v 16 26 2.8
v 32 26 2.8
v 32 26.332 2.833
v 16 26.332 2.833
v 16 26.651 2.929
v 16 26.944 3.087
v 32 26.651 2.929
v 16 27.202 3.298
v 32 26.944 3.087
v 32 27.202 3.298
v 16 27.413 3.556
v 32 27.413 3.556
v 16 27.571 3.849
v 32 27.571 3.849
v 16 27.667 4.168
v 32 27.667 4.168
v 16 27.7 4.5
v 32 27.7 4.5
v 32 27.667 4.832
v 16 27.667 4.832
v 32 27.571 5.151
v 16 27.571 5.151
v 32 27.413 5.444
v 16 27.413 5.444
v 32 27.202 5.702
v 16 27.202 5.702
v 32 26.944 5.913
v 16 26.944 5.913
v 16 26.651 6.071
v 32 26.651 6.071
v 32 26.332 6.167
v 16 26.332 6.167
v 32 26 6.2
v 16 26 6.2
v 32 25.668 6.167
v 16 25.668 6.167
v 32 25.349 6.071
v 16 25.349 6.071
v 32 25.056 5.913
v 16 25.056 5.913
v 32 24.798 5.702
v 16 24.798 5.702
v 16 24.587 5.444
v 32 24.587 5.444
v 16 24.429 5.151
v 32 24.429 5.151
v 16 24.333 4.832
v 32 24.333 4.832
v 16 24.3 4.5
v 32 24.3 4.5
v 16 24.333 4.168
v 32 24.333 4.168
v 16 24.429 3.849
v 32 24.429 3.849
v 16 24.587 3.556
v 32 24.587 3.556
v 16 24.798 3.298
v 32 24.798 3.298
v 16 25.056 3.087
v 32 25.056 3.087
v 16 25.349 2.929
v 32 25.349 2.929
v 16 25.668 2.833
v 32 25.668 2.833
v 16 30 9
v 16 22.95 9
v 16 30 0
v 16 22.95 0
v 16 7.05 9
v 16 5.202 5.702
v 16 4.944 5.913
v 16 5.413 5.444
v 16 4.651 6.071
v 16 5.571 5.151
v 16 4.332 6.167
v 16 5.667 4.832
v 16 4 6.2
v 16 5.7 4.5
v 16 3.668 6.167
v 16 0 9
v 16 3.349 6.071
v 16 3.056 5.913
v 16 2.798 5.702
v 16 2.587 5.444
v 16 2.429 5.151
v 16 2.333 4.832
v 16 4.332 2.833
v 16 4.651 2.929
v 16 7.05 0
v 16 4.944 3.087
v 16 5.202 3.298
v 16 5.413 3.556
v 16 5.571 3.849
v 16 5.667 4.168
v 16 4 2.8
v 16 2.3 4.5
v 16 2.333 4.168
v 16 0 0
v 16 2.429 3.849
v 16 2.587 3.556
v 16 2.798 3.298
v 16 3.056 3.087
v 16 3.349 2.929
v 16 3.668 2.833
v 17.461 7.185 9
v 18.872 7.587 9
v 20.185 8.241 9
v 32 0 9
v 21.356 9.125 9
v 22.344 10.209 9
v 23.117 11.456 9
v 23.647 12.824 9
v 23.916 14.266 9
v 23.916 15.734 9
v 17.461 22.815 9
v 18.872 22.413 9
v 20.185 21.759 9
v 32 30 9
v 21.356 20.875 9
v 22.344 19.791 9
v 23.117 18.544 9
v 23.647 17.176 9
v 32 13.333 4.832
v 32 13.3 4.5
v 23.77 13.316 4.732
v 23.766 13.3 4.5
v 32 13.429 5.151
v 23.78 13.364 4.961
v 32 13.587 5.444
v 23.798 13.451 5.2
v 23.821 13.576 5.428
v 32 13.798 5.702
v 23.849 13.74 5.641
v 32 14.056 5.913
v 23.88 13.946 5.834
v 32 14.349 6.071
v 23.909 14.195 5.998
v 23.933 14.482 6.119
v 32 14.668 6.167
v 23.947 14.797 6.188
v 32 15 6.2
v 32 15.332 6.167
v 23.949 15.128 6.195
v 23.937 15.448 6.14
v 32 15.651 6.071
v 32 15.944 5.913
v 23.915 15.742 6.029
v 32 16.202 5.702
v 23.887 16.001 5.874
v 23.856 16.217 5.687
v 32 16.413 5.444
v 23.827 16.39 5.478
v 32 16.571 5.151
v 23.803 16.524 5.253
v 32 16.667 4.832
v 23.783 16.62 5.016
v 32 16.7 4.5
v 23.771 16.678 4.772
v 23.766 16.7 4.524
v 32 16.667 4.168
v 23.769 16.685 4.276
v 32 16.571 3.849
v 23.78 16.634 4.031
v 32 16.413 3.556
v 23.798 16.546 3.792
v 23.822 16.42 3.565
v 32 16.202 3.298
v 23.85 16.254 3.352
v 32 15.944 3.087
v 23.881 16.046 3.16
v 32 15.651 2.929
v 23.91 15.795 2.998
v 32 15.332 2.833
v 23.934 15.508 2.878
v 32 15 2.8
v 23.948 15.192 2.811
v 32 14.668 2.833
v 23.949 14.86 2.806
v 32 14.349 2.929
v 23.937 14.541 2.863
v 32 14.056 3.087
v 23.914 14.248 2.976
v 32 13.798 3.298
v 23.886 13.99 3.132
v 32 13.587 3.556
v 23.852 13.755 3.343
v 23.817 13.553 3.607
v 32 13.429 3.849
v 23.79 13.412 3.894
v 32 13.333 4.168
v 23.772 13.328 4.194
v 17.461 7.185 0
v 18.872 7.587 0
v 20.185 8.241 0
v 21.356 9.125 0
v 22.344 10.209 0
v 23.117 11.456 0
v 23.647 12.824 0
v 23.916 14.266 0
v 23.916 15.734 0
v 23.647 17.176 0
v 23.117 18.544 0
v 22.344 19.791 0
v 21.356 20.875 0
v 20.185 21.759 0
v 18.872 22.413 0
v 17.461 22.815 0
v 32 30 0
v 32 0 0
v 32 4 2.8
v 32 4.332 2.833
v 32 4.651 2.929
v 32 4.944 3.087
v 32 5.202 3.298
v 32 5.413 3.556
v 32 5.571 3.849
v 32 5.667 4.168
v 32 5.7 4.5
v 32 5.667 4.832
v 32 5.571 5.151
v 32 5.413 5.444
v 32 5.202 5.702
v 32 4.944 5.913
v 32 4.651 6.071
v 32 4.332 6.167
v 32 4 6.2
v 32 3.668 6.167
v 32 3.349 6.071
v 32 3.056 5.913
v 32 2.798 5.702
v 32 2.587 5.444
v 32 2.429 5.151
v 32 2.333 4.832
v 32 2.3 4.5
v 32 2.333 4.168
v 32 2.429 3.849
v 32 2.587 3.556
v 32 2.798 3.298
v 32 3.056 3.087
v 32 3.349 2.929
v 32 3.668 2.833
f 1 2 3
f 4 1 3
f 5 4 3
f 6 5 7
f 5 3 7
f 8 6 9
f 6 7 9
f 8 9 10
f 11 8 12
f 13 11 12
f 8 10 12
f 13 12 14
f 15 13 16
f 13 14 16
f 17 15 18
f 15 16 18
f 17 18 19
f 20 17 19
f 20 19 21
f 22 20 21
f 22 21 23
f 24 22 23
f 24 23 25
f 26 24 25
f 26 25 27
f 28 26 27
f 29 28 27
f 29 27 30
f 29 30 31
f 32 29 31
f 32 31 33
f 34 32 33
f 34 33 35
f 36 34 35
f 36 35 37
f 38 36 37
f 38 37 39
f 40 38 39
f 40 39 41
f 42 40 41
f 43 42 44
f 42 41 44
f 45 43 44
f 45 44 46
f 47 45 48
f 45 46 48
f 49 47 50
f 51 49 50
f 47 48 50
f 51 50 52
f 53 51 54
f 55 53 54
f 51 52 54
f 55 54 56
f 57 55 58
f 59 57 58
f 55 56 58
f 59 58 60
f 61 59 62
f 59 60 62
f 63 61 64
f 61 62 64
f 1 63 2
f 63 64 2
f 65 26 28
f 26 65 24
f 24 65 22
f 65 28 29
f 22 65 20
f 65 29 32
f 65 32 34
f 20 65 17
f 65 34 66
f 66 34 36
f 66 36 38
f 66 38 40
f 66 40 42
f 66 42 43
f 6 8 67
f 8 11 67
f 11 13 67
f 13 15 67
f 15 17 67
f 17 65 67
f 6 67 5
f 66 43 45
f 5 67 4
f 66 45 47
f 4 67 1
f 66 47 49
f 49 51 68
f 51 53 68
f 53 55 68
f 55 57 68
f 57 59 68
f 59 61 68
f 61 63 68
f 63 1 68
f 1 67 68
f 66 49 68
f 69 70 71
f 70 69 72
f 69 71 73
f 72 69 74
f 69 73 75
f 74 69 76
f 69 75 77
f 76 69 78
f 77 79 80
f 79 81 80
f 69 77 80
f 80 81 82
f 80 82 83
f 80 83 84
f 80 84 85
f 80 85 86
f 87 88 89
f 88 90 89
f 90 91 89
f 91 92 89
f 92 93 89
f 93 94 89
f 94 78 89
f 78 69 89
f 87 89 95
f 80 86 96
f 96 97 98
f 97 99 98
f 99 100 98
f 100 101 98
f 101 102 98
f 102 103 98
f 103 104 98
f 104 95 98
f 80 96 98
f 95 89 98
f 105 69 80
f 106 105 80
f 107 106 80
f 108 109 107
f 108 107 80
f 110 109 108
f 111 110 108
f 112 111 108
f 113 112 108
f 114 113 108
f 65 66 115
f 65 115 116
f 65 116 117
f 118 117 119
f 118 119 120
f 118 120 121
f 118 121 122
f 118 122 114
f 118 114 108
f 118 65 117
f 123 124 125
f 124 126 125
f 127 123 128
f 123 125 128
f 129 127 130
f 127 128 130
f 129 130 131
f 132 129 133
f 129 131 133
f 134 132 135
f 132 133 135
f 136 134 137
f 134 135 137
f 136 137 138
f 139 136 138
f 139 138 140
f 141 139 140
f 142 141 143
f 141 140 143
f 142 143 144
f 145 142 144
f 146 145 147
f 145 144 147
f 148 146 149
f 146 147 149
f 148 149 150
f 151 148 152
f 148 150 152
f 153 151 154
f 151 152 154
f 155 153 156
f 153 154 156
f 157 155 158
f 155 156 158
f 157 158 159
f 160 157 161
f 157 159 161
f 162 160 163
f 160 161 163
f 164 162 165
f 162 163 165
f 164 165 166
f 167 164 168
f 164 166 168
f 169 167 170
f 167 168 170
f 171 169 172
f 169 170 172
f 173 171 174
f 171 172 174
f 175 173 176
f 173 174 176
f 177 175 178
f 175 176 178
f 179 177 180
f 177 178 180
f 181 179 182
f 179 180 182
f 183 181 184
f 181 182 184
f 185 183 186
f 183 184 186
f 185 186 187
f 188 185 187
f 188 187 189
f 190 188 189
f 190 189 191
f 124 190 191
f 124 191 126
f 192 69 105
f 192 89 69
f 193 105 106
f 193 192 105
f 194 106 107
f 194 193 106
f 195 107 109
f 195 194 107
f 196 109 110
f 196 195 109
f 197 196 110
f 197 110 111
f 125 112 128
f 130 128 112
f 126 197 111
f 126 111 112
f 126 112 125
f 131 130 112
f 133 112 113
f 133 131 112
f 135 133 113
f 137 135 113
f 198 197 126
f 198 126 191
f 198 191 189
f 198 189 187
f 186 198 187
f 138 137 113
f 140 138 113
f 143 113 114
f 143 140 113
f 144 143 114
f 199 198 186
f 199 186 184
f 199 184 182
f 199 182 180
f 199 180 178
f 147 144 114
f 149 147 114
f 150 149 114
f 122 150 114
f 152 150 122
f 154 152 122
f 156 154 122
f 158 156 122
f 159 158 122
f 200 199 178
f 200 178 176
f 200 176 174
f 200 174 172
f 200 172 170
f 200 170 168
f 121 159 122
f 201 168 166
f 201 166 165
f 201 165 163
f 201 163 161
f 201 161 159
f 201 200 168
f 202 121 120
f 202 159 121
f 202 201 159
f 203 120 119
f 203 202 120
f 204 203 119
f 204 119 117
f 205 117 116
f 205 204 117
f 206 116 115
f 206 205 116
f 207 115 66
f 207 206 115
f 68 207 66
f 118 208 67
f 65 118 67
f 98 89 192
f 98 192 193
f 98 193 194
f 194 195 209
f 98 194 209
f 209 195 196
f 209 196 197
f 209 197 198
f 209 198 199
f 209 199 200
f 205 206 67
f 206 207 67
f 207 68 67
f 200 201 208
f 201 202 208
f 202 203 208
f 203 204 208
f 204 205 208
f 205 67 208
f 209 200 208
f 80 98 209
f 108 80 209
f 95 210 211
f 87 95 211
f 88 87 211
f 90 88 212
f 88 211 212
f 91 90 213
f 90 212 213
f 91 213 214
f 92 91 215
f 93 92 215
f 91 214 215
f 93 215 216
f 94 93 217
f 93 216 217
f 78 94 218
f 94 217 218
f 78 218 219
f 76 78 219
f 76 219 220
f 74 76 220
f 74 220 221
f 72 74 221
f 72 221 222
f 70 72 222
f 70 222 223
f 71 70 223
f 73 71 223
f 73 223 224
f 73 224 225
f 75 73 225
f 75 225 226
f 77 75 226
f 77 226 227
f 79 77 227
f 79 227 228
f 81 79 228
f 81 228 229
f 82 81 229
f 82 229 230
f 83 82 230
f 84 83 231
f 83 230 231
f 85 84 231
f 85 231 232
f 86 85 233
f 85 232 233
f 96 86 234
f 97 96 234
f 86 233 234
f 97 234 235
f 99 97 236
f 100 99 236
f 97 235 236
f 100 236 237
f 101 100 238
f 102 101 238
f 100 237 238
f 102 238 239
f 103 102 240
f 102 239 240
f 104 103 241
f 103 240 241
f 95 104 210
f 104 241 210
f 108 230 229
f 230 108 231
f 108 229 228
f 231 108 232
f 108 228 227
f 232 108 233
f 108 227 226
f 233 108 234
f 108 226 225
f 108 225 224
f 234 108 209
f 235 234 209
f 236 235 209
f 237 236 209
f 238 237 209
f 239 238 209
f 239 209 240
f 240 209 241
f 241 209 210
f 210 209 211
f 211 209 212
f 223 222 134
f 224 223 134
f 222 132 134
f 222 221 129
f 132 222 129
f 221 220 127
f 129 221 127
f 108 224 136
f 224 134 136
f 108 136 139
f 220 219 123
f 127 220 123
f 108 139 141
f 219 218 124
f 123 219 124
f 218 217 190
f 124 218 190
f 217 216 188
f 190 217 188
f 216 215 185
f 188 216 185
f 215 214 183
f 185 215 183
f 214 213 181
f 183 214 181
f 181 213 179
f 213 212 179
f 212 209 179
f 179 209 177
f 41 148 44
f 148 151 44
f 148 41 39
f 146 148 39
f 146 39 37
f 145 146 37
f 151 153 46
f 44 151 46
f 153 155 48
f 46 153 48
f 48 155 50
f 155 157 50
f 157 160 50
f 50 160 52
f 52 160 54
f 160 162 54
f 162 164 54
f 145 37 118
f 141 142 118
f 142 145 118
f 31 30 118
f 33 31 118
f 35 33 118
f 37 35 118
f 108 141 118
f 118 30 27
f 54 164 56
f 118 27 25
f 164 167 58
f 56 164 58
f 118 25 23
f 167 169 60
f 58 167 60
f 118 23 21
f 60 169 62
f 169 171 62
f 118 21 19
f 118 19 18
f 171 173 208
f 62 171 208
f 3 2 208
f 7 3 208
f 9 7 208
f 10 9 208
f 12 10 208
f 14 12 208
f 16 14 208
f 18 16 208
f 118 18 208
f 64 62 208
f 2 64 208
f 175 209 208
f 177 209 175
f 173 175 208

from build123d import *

# Parameters (mm, degrees)
IZIM1_R                     = 7.95
Y_KSEKLIK_EKSTR_ZYON1_DEPTH = 9
IZIM2_R                     = 1.7
KES_EKSTR_ZYON1_DEPTH       = 50
IZIM3_R                     = 1.7
KES_EKSTR_ZYON2_DEPTH       = 29
KES_EKSTR_ZYON3_DEPTH       = 10
Y_KSEKLIK_EKSTR_ZYON2_REACH = 46.777
IZIM5_W                     = 5.408103146
IZIM5_H                     = 14.931073895
IZIM6_R                     = 1.7
KES_EKSTR_ZYON4_DEPTH       = 10


with BuildPart() as part:
    # Çizim1 → Yükseklik-Ekstrüzyon1 (new body)
    with BuildSketch(Plane.XY):
        with BuildLine():
            Line((0, 0), (32, 0))
            Line((32, 0), (32, 8))
            Line((32, 8), (31.5, 8))
            ThreePointArc((31.5, 8), (28.671572875, 9.171572875), (27.5, 12))
            Line((27.5, 12), (27.5, 18))
            ThreePointArc((27.5, 18), (28.671572875, 20.828427125), (31.5, 22))
            Line((31.5, 22), (32, 22))
            Line((32, 22), (32, 30))
            Line((32, 30), (0, 30))
            Line((0, 30), (0, 22))
            Line((0, 22), (0.5, 22))
            ThreePointArc((0.5, 22), (3.328427125, 20.828427125), (4.5, 18))
            Line((4.5, 18), (4.5, 12))
            ThreePointArc((4.5, 12), (3.328427125, 9.171572875), (0.5, 8))
            Line((0.5, 8), (0, 8))
            Line((0, 8), (0, 0))
        make_face()
        with Locations((16, 15)):
            Circle(IZIM1_R, mode=Mode.SUBTRACT)
    extrude(amount=Y_KSEKLIK_EKSTR_ZYON1_DEPTH)

    # Çizim2 → Kes-Ekstrüzyon1 (cut)
    with BuildSketch(Plane(origin=(32, 0, 0), x_dir=(0, 0, -1), z_dir=(1, 0, 0))):
        with Locations((-4.5, 4)):
            Circle(IZIM2_R)
        with Locations((-4.5, 26)):
            Circle(IZIM2_R)
    extrude(amount=-KES_EKSTR_ZYON1_DEPTH, mode=Mode.SUBTRACT)

    # Çizim3 → Kes-Ekstrüzyon2 (cut)
    with BuildSketch(Plane.ZY.offset(-4.5)):
        with Locations(Location((4.5, 15, 0), (0, 0, 270))):
            Circle(IZIM3_R)
    extrude(amount=-KES_EKSTR_ZYON2_DEPTH, mode=Mode.SUBTRACT)

    # Çizim4 → Kes-Ekstrüzyon3 (cut)
    with BuildSketch(Plane(origin=(0, 0, 0), x_dir=(-1, 0, 0), z_dir=(0, 0, -1))):
        Polygon((-16, 30), (-16, 0), (9.241069926, -10.278514345), (11.843794838, 24.557008953), (11.843794838, 39.531622814), align=None)
    extrude(amount=-KES_EKSTR_ZYON3_DEPTH, mode=Mode.SUBTRACT)

    # Yükseklik-Ekstrüzyon2: up to this face of the body (flat: up to its plane)
    y_kseklik_ekstr_zyon2_end = Plane(part.part.faces().sort_by_distance((24.391799767, 15, 9))[0])
    # Çizim5 → Yükseklik-Ekstrüzyon2 (add, up to the picked face)
    with BuildSketch(Plane(origin=(0, 0, 0), x_dir=(-1, 0, 0), z_dir=(0, 0, -1)), mode=Mode.PRIVATE) as y_kseklik_ekstr_zyon2_sk1:
        with Locations((-29.295948427, 14.534463052)):
            Rectangle(IZIM5_W, IZIM5_H)
    y_kseklik_ekstr_zyon2_tool1 = split(extrude(y_kseklik_ekstr_zyon2_sk1.sketch, amount=-Y_KSEKLIK_EKSTR_ZYON2_REACH, mode=Mode.PRIVATE), bisect_by=y_kseklik_ekstr_zyon2_end, keep=Keep.BOTH, mode=Mode.PRIVATE)
    add(y_kseklik_ekstr_zyon2_tool1.solids().sort_by(Axis((29.295948, 14.534463, 0), (0, 0, 1)))[0])

    # Çizim6 → Kes-Ekstrüzyon4 (cut)
    with BuildSketch(Plane.ZY.offset(-26.591896854)):
        with Locations(Location((4.5, 15, 0), (0, 0, 270))):
            Circle(IZIM6_R)
    extrude(amount=-KES_EKSTR_ZYON4_DEPTH, mode=Mode.SUBTRACT)


solid = part.part
